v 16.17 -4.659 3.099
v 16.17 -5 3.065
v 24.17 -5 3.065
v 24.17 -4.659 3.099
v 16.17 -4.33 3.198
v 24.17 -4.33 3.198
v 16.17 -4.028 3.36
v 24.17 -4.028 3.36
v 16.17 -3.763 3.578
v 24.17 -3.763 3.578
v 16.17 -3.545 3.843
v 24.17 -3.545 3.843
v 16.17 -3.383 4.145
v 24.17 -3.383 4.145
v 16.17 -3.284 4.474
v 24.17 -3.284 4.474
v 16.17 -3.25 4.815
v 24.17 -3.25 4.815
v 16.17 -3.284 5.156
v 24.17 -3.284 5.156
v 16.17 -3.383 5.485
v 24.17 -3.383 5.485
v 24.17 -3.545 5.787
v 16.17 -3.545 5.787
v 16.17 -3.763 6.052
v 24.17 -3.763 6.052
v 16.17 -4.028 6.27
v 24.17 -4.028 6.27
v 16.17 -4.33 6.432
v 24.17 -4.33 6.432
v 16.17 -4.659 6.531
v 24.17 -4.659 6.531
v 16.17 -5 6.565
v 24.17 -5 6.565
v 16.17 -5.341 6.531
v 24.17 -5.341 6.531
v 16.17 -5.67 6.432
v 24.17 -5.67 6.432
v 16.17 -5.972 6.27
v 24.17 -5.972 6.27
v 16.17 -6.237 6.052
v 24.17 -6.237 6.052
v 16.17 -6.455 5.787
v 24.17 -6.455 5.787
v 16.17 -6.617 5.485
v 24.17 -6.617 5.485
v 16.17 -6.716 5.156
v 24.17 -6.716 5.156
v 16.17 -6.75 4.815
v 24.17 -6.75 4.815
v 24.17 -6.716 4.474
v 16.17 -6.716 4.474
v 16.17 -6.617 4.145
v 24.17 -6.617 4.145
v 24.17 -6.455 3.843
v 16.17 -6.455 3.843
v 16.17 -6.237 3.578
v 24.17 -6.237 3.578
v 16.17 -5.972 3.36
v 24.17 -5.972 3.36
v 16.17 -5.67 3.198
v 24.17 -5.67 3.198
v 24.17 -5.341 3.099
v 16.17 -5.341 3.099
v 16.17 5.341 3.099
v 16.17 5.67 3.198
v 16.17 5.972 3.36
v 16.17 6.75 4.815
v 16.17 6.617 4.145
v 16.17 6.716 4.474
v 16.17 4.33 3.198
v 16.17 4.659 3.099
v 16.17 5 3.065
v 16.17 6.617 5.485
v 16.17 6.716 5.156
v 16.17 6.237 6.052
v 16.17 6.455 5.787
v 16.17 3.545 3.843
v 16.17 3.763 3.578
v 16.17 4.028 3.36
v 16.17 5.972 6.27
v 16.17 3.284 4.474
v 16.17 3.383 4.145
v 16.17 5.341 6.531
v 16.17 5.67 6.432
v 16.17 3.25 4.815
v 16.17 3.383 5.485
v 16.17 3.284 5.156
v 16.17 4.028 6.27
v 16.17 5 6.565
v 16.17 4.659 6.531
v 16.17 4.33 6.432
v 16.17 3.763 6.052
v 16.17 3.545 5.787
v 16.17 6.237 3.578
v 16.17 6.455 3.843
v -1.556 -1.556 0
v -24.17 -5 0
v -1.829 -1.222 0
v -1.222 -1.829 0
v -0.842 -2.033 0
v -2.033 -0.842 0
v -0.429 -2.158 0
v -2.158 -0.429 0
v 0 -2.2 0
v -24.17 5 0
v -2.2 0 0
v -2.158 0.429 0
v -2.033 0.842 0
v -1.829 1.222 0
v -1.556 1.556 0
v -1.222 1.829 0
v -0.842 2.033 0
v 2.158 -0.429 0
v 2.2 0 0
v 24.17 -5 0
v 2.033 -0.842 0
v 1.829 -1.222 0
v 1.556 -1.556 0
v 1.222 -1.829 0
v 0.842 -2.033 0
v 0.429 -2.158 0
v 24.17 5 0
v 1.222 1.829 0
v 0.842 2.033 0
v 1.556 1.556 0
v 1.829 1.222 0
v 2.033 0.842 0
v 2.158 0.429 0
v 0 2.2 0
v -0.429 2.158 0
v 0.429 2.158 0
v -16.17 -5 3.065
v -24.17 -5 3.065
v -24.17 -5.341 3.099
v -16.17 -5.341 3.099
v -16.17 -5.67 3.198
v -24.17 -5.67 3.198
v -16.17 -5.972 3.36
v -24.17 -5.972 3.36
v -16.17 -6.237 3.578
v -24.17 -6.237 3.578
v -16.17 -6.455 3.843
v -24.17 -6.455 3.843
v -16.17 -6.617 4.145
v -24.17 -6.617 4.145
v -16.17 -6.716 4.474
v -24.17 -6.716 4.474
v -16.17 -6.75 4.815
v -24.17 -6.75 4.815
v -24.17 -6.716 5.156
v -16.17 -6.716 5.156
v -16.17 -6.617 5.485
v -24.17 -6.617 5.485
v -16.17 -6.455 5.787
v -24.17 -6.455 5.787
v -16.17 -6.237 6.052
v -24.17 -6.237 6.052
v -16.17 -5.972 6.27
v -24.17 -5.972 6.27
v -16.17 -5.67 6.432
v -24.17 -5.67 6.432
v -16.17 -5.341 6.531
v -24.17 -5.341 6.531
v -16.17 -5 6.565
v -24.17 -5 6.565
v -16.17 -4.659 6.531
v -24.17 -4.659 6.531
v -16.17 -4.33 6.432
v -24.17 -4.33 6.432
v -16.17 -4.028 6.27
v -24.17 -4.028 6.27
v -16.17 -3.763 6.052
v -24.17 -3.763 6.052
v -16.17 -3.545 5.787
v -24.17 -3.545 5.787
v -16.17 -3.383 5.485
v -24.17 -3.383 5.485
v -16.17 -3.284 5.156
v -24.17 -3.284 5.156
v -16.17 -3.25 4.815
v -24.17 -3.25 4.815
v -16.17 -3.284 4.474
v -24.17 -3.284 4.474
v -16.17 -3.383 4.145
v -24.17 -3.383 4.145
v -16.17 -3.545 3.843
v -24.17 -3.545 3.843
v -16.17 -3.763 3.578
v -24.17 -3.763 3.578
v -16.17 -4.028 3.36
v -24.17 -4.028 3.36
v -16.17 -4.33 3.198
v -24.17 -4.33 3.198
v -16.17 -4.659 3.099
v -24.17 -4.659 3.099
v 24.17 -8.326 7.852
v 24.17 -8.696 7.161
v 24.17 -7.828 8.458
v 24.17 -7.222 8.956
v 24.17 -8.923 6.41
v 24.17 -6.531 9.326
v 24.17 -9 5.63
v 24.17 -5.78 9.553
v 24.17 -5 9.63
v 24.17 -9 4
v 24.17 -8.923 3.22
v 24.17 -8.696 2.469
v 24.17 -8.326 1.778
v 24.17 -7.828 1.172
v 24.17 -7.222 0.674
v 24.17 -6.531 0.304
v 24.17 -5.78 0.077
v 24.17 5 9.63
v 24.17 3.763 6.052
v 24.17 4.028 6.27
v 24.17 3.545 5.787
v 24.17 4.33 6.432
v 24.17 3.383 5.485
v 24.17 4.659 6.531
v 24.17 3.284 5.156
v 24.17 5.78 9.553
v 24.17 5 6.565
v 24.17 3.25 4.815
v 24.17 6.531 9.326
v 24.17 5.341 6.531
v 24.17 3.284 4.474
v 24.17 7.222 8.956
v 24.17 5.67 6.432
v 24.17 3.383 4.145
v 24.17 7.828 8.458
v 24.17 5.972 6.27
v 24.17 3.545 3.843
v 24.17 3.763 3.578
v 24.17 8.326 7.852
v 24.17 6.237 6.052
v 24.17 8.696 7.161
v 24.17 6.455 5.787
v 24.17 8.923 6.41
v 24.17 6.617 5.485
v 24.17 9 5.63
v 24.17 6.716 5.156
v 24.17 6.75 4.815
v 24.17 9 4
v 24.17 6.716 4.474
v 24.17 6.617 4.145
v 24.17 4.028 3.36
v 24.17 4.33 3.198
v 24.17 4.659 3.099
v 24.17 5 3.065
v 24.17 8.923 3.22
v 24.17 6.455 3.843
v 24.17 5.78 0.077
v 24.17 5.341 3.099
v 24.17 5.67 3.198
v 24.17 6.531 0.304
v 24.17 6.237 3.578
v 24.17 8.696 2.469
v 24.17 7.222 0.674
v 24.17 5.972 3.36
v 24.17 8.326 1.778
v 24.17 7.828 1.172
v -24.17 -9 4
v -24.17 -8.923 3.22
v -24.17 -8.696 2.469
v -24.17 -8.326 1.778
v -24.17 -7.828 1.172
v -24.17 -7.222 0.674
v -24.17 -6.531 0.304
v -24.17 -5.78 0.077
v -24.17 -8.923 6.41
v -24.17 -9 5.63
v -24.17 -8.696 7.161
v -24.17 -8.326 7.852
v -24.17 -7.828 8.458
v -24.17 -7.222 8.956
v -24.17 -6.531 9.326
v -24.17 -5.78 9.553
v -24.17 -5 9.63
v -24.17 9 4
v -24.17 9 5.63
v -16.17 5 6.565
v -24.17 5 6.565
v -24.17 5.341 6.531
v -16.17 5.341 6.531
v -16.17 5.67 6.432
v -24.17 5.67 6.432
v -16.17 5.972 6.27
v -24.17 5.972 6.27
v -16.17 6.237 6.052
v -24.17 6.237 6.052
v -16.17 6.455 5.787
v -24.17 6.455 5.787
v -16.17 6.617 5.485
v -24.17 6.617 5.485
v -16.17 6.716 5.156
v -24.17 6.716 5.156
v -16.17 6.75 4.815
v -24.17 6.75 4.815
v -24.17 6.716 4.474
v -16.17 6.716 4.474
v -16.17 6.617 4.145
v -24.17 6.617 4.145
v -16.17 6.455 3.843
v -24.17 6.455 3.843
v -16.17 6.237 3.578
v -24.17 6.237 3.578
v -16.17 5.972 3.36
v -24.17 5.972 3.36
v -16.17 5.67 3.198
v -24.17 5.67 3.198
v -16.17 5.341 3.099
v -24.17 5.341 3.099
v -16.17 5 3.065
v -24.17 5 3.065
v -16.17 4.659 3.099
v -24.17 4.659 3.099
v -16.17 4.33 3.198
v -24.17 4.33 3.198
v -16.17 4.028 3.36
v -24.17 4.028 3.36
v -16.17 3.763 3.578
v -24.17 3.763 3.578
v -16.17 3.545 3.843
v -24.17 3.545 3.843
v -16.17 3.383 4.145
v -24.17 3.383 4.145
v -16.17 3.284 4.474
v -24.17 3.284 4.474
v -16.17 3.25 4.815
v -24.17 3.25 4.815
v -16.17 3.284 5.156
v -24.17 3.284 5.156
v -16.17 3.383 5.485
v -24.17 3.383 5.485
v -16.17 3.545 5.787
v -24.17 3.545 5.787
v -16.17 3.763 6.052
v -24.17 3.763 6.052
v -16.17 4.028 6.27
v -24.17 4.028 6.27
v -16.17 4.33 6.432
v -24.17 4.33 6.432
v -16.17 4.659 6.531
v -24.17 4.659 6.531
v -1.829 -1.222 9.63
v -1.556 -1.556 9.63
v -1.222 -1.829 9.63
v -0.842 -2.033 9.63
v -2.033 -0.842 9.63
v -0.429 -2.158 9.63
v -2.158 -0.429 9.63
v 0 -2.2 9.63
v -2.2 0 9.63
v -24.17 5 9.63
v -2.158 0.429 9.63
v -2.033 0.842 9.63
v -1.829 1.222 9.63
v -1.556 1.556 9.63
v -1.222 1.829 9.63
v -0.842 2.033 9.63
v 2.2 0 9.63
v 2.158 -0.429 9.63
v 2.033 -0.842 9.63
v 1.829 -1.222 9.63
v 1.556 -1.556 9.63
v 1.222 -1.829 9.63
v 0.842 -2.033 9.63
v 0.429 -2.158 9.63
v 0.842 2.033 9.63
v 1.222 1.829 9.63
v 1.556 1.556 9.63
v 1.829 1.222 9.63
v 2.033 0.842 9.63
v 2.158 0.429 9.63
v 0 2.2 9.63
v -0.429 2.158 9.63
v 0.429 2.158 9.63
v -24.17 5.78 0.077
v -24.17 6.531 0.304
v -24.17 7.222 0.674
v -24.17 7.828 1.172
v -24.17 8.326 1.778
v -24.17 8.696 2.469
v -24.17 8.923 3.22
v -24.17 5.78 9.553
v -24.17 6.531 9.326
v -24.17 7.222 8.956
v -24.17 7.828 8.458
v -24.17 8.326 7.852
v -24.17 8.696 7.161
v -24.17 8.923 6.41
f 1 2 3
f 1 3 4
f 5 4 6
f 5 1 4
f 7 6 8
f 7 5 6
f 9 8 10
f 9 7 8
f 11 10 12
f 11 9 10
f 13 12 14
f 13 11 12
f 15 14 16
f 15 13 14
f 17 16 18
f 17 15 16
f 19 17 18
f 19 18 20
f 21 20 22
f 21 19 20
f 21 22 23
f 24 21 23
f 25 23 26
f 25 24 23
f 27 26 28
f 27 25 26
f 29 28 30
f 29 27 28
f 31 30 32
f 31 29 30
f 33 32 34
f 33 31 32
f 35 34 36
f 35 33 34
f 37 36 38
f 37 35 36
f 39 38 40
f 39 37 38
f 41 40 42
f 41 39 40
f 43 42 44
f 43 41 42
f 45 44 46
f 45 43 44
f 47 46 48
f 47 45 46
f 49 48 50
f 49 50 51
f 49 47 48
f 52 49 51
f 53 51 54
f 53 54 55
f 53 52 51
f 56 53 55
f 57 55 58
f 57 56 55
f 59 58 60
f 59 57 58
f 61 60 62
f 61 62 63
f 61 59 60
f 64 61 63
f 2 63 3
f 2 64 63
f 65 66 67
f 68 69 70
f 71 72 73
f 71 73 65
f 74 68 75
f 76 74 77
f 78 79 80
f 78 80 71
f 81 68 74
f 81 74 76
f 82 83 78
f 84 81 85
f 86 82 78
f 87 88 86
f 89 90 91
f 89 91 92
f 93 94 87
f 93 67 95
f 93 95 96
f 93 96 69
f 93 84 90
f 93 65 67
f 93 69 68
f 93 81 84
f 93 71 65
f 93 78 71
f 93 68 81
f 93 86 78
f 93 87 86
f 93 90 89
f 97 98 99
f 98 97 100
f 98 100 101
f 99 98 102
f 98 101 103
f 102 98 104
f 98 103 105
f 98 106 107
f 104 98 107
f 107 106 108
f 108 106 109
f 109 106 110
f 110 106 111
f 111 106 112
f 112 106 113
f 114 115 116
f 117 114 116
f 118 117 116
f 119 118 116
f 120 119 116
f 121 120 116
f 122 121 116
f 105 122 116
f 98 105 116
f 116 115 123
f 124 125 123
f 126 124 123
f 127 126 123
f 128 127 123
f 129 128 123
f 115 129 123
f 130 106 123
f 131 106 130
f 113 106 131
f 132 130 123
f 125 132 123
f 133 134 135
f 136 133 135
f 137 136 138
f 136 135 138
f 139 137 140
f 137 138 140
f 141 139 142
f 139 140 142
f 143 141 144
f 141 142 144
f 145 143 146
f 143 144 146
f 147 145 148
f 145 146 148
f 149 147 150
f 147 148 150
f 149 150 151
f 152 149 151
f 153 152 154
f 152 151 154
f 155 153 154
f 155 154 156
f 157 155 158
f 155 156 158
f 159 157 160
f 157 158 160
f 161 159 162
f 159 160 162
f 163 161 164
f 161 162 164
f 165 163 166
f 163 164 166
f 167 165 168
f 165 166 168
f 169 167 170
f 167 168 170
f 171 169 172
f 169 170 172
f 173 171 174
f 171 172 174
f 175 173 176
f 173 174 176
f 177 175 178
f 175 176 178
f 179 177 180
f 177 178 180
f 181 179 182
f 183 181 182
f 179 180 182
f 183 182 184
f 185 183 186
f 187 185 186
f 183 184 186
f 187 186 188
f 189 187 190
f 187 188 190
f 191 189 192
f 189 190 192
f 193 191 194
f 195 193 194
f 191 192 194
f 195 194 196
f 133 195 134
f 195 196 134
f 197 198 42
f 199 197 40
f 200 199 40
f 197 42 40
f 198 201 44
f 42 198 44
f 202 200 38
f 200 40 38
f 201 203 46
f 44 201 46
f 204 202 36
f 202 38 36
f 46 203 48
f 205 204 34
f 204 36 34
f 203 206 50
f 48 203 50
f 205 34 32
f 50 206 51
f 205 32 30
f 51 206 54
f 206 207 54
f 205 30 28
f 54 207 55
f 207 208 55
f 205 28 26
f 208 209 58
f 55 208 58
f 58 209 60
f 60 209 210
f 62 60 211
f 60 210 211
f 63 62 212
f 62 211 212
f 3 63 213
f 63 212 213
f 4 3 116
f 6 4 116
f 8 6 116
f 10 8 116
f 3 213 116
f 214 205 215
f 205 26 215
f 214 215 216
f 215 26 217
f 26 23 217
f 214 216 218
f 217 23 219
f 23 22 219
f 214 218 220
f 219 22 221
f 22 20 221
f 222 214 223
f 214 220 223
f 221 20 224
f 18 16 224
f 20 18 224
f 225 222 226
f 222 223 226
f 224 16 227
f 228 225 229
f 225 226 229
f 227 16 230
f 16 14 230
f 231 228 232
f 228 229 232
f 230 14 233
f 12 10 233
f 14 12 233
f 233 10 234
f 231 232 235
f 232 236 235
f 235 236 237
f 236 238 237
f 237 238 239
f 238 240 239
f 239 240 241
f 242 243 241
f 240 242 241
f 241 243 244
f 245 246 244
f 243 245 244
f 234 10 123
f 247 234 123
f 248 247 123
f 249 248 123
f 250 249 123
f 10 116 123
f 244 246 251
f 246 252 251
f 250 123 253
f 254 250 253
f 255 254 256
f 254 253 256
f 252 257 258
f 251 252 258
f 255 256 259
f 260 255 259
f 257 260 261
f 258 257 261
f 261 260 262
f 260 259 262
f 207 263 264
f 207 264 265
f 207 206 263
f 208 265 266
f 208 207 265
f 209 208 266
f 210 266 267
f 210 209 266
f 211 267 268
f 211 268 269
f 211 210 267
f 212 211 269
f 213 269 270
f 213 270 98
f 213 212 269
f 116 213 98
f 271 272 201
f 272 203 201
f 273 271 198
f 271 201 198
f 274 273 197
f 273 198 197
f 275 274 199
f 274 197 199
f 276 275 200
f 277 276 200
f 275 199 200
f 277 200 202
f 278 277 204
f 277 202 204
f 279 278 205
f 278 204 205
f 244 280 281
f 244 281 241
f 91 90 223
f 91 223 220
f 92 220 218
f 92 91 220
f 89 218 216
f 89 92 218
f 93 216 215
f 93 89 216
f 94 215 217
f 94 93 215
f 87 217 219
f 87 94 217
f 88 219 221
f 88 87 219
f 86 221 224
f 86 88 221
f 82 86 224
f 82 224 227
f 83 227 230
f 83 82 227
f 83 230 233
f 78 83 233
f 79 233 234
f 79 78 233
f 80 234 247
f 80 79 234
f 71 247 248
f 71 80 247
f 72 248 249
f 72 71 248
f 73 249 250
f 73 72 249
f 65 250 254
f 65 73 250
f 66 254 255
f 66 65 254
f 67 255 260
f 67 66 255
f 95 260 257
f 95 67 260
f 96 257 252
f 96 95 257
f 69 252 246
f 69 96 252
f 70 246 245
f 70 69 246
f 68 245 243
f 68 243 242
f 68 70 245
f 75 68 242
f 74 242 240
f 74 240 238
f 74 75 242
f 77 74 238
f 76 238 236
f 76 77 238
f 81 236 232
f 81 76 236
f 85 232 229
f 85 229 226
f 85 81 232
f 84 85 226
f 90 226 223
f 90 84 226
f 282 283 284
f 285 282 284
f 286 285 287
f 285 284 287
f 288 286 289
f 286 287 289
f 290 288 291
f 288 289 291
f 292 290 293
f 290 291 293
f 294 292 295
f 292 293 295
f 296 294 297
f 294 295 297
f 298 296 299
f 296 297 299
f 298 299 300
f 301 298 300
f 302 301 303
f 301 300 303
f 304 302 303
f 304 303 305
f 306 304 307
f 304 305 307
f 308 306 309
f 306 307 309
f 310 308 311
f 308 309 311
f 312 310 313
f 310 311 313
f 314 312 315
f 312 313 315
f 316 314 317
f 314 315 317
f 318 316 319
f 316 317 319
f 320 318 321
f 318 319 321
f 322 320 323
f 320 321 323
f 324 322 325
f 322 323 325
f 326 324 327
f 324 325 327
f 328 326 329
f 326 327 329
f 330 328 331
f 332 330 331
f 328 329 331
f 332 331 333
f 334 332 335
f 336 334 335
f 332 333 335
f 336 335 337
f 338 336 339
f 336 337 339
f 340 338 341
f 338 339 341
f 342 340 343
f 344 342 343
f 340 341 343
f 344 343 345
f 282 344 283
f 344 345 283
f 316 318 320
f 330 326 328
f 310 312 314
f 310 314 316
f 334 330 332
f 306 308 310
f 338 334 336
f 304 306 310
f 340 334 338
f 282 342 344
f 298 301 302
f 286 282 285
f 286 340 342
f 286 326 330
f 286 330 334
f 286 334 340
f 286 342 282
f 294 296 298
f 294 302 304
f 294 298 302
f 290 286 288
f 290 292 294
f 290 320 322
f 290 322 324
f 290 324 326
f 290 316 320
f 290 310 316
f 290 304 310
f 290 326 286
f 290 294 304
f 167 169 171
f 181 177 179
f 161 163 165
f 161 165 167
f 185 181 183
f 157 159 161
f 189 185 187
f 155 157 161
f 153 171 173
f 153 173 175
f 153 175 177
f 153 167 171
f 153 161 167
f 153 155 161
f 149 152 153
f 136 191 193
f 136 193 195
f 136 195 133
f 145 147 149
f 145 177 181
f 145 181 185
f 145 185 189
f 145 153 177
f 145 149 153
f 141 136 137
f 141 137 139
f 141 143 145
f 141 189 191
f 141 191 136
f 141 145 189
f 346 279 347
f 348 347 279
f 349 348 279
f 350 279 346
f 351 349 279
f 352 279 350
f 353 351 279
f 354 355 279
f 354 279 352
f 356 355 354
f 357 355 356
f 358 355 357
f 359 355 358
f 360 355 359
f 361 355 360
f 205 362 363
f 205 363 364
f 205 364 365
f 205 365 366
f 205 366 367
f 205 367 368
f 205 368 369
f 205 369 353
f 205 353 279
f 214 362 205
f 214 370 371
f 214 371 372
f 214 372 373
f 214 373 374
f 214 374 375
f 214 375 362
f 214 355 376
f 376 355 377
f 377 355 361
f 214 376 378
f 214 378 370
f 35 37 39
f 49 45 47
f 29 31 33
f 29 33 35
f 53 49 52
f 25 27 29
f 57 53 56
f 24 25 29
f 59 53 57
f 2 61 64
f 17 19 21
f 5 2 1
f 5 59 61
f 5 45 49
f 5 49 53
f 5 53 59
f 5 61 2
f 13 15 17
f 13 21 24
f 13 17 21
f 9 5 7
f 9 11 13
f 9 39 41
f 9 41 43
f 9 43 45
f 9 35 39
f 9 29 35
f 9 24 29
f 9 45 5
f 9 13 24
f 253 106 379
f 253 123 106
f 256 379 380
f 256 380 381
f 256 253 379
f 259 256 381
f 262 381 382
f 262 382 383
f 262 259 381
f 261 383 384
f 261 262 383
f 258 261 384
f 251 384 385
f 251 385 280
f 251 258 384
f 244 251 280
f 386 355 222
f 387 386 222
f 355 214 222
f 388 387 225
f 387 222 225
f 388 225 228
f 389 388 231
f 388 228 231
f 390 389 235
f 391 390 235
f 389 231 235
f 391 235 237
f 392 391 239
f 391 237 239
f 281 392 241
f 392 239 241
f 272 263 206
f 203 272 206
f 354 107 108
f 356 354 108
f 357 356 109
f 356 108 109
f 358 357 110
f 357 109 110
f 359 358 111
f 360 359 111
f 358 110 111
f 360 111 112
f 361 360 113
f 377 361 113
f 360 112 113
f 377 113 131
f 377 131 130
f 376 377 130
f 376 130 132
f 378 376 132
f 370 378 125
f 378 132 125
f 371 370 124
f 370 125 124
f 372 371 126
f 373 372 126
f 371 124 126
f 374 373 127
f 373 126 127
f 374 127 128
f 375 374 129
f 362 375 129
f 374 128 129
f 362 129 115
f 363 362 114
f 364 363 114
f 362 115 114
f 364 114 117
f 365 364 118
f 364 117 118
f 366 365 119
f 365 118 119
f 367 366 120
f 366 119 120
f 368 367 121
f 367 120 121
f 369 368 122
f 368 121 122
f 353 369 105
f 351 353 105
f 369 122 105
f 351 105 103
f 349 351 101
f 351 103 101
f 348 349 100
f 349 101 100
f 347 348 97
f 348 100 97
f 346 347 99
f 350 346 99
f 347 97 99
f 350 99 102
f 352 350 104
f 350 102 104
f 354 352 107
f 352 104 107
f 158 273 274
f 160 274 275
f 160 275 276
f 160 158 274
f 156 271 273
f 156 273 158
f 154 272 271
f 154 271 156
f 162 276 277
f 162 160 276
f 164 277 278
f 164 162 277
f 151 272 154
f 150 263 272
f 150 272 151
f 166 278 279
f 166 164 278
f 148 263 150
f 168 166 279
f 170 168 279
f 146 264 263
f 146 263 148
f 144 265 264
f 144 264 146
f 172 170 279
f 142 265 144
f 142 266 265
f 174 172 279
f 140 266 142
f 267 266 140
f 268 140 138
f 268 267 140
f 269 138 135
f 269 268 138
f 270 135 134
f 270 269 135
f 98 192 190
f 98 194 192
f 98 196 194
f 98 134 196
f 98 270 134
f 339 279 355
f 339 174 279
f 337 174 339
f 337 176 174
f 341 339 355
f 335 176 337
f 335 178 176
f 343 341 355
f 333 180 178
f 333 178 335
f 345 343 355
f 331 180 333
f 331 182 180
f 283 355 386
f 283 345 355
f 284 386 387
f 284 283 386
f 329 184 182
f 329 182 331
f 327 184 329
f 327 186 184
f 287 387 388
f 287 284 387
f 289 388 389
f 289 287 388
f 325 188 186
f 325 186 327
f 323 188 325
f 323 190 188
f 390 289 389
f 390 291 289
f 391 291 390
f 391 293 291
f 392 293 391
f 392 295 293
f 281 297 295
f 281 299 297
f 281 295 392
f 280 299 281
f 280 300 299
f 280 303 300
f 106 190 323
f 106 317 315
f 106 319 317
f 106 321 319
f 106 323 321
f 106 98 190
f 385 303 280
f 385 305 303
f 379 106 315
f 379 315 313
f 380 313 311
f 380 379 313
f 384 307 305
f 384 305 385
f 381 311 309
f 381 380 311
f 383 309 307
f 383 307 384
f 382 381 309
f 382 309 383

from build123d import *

# Parameters (mm, degrees)
SKETCH1_W         = 48.34
SKETCH1_H         = 18
EXTRUDE_3_8_DEPTH = 9.63
SKETCH2_R         = 1.75
M4_DRILL_DEPTH    = 8
M4_DRILL2_START   = -8
SKETCH3_R         = 1.75
M4_DRILL2_DEPTH   = 8
SKETCH5_R         = 2.2
M5_DRILL_DEPTH    = 9.63
FILLET1_R         = 4


with BuildPart() as part:
    # Sketch1 → 3/8 (new body)
    with BuildSketch(Plane.XY):
        Rectangle(SKETCH1_W, SKETCH1_H)
    extrude(amount=EXTRUDE_3_8_DEPTH)

    # Sketch2 → M4_DRILL (cut)
    with BuildSketch(Plane.ZY.offset(24.17)):
        with Locations((4.815, 5)):
            Circle(SKETCH2_R)
        with Locations(Location((4.815, -5, 0), (0, 0, 180))):
            Circle(SKETCH2_R)
    extrude(amount=-M4_DRILL_DEPTH, mode=Mode.SUBTRACT)

    # Sketch3 → M4_DRILL2 (cut)
    with BuildSketch(Plane(origin=(24.17, 0, 0), x_dir=(0, 0, -1), z_dir=(1, 0, 0)).offset(M4_DRILL2_START)):
        with Locations((-4.815, -5)):
            Circle(SKETCH3_R)
        with Locations(Location((-4.815, 5, 0), (0, 0, 180))):
            Circle(SKETCH3_R)
    extrude(amount=M4_DRILL2_DEPTH, mode=Mode.SUBTRACT)

    # Sketch5 → M5_DRILL (cut)
    with BuildSketch(Plane(origin=(0, 0, 0), x_dir=(-1, 0, 0), z_dir=(0, 0, -1))):
        Circle(SKETCH5_R)
    extrude(amount=-M5_DRILL_DEPTH, mode=Mode.SUBTRACT)

    # Fillet1
    fillet1_edges = [part.edges().sort_by_distance(p)[0] for p in [
        (0, -9, 9.63),
        (0, -9, 0),
        (0, 9, 0),
        (0, 9, 9.63),
    ]]
    fillet(fillet1_edges, radius=FILLET1_R)


solid = part.part
